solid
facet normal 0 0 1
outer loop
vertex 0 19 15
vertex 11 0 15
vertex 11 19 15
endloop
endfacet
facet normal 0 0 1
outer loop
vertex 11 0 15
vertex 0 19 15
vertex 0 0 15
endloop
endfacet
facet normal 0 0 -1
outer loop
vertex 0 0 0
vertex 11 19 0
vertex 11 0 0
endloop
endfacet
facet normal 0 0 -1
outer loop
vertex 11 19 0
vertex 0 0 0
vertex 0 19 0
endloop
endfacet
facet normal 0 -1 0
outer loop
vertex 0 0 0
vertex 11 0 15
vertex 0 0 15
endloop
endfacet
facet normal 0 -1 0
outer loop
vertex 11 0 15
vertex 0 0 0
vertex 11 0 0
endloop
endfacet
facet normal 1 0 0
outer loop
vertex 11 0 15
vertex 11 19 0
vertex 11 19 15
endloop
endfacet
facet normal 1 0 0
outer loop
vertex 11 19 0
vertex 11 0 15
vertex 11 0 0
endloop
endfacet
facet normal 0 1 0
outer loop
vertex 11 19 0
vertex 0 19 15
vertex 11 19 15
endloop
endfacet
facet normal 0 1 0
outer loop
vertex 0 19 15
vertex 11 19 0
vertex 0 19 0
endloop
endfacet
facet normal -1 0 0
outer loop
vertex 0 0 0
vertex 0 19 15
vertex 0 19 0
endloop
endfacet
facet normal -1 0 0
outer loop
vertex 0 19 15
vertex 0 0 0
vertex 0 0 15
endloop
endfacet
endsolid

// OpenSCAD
// Generated by SolidPython 1.0.1 on 2020-07-29 00:46:55


cube(size = [11, 19, 15]);
/***********************************************
*********      SolidPython code:      **********
************************************************
 
# import packages: SolidPython
from solid import *
from solid.utils import *
from itertools import chain, combinations, permutations


class Resize:

    def __init__(self, scad_file):
        self.scad_file = scad_file
        #self.scad_file = import_scad(scad_file)
        # cone/cylinder param:
        self.r1 = 0
        self.r2 = 0
        self.h = 0
        # rectangular prism param:
        self.w = 0
        self.l = 0
        # ellipse param:
        self.r = 0

    # import OpenScad code (file name corresponds to shape)


    # classify shape + parameters
    def assign(self, param1, param2, param3):
        if self.scad_file == 'cone.scad':
            self.r1 = param1
            self.r2 = param2
            self.h = param3
        elif self.scad_file == 'cylinder.scad':
            self.r1 = param1
            self.r2 = param2
            self.h = param3
        elif self.scad_file == 'rectangularPrism.scad':
            self.h = param1
            self.l = param2
            self.w = param3
        else:
            self.r = param1
            self.h = param2

    # resize parameters
    def iterate(self):
        x = range(3, 20, 2)
        i = 1
        if self.scad_file == 'cone.scad':
            tempList = list(permutations(x, 2))
            for temp in tempList:
                param1 = temp[0]
                param2 = temp[1]
                filepath = 'produced_scad_files/' + 'cone' + str(param1) + '_' + str(param2) + '_' + '.scad'
                scad_render_to_file(cylinder(h=param1, r1=param2, r2=0), filepath)

        elif self.scad_file == 'cylinder.scad':
            tempList = list(permutations(x, 3))
            for temp in tempList:
                param1 = temp[0]
                param2 = temp[1]
                filepath = 'produced_scad_files/' + 'cylinder' + str(param1) + '_' + str(param2) + '_' + '.scad'
                scad_render_to_file(cylinder(h=param1, r1=param2, r2=param2), filepath)

        elif self.scad_file == 'rectangularPrism.scad':
            tempList = list(permutations(x, 3))
            for temp in tempList:
                param1 = temp[0]
                param2 = temp[1]
                param3 = temp[2]
                filepath = 'produced_scad_files/' + 'rectangularPrism' + str(param1) + '_' + str(param2) + '_' + str(
                    param3) + '.scad'
                scad_render_to_file(cube(size=(param1, param2, param3)), filepath)

        elif self.scad_file == 'ellipse.scad':
            tempList = list(permutations(x, 4))
            for temp in tempList:
                param1 = temp[0]
                param2 = temp[1]
                param3 = temp[2]
                param4 = temp[3]
                filepath = 'produced_scad_files/' + 'ellipse' + str(param1) + '_' + str(param2) + '_' + str(param3) + '_' + str(param4) + '.scad'
                scad_render_to_file(scale([param1, param2, param3])(sphere(r=param4)), filepath)

    def render_to_scadfile(self):
        scad_render_to_file(scad, 'example.scad') 
 
************************************************/
